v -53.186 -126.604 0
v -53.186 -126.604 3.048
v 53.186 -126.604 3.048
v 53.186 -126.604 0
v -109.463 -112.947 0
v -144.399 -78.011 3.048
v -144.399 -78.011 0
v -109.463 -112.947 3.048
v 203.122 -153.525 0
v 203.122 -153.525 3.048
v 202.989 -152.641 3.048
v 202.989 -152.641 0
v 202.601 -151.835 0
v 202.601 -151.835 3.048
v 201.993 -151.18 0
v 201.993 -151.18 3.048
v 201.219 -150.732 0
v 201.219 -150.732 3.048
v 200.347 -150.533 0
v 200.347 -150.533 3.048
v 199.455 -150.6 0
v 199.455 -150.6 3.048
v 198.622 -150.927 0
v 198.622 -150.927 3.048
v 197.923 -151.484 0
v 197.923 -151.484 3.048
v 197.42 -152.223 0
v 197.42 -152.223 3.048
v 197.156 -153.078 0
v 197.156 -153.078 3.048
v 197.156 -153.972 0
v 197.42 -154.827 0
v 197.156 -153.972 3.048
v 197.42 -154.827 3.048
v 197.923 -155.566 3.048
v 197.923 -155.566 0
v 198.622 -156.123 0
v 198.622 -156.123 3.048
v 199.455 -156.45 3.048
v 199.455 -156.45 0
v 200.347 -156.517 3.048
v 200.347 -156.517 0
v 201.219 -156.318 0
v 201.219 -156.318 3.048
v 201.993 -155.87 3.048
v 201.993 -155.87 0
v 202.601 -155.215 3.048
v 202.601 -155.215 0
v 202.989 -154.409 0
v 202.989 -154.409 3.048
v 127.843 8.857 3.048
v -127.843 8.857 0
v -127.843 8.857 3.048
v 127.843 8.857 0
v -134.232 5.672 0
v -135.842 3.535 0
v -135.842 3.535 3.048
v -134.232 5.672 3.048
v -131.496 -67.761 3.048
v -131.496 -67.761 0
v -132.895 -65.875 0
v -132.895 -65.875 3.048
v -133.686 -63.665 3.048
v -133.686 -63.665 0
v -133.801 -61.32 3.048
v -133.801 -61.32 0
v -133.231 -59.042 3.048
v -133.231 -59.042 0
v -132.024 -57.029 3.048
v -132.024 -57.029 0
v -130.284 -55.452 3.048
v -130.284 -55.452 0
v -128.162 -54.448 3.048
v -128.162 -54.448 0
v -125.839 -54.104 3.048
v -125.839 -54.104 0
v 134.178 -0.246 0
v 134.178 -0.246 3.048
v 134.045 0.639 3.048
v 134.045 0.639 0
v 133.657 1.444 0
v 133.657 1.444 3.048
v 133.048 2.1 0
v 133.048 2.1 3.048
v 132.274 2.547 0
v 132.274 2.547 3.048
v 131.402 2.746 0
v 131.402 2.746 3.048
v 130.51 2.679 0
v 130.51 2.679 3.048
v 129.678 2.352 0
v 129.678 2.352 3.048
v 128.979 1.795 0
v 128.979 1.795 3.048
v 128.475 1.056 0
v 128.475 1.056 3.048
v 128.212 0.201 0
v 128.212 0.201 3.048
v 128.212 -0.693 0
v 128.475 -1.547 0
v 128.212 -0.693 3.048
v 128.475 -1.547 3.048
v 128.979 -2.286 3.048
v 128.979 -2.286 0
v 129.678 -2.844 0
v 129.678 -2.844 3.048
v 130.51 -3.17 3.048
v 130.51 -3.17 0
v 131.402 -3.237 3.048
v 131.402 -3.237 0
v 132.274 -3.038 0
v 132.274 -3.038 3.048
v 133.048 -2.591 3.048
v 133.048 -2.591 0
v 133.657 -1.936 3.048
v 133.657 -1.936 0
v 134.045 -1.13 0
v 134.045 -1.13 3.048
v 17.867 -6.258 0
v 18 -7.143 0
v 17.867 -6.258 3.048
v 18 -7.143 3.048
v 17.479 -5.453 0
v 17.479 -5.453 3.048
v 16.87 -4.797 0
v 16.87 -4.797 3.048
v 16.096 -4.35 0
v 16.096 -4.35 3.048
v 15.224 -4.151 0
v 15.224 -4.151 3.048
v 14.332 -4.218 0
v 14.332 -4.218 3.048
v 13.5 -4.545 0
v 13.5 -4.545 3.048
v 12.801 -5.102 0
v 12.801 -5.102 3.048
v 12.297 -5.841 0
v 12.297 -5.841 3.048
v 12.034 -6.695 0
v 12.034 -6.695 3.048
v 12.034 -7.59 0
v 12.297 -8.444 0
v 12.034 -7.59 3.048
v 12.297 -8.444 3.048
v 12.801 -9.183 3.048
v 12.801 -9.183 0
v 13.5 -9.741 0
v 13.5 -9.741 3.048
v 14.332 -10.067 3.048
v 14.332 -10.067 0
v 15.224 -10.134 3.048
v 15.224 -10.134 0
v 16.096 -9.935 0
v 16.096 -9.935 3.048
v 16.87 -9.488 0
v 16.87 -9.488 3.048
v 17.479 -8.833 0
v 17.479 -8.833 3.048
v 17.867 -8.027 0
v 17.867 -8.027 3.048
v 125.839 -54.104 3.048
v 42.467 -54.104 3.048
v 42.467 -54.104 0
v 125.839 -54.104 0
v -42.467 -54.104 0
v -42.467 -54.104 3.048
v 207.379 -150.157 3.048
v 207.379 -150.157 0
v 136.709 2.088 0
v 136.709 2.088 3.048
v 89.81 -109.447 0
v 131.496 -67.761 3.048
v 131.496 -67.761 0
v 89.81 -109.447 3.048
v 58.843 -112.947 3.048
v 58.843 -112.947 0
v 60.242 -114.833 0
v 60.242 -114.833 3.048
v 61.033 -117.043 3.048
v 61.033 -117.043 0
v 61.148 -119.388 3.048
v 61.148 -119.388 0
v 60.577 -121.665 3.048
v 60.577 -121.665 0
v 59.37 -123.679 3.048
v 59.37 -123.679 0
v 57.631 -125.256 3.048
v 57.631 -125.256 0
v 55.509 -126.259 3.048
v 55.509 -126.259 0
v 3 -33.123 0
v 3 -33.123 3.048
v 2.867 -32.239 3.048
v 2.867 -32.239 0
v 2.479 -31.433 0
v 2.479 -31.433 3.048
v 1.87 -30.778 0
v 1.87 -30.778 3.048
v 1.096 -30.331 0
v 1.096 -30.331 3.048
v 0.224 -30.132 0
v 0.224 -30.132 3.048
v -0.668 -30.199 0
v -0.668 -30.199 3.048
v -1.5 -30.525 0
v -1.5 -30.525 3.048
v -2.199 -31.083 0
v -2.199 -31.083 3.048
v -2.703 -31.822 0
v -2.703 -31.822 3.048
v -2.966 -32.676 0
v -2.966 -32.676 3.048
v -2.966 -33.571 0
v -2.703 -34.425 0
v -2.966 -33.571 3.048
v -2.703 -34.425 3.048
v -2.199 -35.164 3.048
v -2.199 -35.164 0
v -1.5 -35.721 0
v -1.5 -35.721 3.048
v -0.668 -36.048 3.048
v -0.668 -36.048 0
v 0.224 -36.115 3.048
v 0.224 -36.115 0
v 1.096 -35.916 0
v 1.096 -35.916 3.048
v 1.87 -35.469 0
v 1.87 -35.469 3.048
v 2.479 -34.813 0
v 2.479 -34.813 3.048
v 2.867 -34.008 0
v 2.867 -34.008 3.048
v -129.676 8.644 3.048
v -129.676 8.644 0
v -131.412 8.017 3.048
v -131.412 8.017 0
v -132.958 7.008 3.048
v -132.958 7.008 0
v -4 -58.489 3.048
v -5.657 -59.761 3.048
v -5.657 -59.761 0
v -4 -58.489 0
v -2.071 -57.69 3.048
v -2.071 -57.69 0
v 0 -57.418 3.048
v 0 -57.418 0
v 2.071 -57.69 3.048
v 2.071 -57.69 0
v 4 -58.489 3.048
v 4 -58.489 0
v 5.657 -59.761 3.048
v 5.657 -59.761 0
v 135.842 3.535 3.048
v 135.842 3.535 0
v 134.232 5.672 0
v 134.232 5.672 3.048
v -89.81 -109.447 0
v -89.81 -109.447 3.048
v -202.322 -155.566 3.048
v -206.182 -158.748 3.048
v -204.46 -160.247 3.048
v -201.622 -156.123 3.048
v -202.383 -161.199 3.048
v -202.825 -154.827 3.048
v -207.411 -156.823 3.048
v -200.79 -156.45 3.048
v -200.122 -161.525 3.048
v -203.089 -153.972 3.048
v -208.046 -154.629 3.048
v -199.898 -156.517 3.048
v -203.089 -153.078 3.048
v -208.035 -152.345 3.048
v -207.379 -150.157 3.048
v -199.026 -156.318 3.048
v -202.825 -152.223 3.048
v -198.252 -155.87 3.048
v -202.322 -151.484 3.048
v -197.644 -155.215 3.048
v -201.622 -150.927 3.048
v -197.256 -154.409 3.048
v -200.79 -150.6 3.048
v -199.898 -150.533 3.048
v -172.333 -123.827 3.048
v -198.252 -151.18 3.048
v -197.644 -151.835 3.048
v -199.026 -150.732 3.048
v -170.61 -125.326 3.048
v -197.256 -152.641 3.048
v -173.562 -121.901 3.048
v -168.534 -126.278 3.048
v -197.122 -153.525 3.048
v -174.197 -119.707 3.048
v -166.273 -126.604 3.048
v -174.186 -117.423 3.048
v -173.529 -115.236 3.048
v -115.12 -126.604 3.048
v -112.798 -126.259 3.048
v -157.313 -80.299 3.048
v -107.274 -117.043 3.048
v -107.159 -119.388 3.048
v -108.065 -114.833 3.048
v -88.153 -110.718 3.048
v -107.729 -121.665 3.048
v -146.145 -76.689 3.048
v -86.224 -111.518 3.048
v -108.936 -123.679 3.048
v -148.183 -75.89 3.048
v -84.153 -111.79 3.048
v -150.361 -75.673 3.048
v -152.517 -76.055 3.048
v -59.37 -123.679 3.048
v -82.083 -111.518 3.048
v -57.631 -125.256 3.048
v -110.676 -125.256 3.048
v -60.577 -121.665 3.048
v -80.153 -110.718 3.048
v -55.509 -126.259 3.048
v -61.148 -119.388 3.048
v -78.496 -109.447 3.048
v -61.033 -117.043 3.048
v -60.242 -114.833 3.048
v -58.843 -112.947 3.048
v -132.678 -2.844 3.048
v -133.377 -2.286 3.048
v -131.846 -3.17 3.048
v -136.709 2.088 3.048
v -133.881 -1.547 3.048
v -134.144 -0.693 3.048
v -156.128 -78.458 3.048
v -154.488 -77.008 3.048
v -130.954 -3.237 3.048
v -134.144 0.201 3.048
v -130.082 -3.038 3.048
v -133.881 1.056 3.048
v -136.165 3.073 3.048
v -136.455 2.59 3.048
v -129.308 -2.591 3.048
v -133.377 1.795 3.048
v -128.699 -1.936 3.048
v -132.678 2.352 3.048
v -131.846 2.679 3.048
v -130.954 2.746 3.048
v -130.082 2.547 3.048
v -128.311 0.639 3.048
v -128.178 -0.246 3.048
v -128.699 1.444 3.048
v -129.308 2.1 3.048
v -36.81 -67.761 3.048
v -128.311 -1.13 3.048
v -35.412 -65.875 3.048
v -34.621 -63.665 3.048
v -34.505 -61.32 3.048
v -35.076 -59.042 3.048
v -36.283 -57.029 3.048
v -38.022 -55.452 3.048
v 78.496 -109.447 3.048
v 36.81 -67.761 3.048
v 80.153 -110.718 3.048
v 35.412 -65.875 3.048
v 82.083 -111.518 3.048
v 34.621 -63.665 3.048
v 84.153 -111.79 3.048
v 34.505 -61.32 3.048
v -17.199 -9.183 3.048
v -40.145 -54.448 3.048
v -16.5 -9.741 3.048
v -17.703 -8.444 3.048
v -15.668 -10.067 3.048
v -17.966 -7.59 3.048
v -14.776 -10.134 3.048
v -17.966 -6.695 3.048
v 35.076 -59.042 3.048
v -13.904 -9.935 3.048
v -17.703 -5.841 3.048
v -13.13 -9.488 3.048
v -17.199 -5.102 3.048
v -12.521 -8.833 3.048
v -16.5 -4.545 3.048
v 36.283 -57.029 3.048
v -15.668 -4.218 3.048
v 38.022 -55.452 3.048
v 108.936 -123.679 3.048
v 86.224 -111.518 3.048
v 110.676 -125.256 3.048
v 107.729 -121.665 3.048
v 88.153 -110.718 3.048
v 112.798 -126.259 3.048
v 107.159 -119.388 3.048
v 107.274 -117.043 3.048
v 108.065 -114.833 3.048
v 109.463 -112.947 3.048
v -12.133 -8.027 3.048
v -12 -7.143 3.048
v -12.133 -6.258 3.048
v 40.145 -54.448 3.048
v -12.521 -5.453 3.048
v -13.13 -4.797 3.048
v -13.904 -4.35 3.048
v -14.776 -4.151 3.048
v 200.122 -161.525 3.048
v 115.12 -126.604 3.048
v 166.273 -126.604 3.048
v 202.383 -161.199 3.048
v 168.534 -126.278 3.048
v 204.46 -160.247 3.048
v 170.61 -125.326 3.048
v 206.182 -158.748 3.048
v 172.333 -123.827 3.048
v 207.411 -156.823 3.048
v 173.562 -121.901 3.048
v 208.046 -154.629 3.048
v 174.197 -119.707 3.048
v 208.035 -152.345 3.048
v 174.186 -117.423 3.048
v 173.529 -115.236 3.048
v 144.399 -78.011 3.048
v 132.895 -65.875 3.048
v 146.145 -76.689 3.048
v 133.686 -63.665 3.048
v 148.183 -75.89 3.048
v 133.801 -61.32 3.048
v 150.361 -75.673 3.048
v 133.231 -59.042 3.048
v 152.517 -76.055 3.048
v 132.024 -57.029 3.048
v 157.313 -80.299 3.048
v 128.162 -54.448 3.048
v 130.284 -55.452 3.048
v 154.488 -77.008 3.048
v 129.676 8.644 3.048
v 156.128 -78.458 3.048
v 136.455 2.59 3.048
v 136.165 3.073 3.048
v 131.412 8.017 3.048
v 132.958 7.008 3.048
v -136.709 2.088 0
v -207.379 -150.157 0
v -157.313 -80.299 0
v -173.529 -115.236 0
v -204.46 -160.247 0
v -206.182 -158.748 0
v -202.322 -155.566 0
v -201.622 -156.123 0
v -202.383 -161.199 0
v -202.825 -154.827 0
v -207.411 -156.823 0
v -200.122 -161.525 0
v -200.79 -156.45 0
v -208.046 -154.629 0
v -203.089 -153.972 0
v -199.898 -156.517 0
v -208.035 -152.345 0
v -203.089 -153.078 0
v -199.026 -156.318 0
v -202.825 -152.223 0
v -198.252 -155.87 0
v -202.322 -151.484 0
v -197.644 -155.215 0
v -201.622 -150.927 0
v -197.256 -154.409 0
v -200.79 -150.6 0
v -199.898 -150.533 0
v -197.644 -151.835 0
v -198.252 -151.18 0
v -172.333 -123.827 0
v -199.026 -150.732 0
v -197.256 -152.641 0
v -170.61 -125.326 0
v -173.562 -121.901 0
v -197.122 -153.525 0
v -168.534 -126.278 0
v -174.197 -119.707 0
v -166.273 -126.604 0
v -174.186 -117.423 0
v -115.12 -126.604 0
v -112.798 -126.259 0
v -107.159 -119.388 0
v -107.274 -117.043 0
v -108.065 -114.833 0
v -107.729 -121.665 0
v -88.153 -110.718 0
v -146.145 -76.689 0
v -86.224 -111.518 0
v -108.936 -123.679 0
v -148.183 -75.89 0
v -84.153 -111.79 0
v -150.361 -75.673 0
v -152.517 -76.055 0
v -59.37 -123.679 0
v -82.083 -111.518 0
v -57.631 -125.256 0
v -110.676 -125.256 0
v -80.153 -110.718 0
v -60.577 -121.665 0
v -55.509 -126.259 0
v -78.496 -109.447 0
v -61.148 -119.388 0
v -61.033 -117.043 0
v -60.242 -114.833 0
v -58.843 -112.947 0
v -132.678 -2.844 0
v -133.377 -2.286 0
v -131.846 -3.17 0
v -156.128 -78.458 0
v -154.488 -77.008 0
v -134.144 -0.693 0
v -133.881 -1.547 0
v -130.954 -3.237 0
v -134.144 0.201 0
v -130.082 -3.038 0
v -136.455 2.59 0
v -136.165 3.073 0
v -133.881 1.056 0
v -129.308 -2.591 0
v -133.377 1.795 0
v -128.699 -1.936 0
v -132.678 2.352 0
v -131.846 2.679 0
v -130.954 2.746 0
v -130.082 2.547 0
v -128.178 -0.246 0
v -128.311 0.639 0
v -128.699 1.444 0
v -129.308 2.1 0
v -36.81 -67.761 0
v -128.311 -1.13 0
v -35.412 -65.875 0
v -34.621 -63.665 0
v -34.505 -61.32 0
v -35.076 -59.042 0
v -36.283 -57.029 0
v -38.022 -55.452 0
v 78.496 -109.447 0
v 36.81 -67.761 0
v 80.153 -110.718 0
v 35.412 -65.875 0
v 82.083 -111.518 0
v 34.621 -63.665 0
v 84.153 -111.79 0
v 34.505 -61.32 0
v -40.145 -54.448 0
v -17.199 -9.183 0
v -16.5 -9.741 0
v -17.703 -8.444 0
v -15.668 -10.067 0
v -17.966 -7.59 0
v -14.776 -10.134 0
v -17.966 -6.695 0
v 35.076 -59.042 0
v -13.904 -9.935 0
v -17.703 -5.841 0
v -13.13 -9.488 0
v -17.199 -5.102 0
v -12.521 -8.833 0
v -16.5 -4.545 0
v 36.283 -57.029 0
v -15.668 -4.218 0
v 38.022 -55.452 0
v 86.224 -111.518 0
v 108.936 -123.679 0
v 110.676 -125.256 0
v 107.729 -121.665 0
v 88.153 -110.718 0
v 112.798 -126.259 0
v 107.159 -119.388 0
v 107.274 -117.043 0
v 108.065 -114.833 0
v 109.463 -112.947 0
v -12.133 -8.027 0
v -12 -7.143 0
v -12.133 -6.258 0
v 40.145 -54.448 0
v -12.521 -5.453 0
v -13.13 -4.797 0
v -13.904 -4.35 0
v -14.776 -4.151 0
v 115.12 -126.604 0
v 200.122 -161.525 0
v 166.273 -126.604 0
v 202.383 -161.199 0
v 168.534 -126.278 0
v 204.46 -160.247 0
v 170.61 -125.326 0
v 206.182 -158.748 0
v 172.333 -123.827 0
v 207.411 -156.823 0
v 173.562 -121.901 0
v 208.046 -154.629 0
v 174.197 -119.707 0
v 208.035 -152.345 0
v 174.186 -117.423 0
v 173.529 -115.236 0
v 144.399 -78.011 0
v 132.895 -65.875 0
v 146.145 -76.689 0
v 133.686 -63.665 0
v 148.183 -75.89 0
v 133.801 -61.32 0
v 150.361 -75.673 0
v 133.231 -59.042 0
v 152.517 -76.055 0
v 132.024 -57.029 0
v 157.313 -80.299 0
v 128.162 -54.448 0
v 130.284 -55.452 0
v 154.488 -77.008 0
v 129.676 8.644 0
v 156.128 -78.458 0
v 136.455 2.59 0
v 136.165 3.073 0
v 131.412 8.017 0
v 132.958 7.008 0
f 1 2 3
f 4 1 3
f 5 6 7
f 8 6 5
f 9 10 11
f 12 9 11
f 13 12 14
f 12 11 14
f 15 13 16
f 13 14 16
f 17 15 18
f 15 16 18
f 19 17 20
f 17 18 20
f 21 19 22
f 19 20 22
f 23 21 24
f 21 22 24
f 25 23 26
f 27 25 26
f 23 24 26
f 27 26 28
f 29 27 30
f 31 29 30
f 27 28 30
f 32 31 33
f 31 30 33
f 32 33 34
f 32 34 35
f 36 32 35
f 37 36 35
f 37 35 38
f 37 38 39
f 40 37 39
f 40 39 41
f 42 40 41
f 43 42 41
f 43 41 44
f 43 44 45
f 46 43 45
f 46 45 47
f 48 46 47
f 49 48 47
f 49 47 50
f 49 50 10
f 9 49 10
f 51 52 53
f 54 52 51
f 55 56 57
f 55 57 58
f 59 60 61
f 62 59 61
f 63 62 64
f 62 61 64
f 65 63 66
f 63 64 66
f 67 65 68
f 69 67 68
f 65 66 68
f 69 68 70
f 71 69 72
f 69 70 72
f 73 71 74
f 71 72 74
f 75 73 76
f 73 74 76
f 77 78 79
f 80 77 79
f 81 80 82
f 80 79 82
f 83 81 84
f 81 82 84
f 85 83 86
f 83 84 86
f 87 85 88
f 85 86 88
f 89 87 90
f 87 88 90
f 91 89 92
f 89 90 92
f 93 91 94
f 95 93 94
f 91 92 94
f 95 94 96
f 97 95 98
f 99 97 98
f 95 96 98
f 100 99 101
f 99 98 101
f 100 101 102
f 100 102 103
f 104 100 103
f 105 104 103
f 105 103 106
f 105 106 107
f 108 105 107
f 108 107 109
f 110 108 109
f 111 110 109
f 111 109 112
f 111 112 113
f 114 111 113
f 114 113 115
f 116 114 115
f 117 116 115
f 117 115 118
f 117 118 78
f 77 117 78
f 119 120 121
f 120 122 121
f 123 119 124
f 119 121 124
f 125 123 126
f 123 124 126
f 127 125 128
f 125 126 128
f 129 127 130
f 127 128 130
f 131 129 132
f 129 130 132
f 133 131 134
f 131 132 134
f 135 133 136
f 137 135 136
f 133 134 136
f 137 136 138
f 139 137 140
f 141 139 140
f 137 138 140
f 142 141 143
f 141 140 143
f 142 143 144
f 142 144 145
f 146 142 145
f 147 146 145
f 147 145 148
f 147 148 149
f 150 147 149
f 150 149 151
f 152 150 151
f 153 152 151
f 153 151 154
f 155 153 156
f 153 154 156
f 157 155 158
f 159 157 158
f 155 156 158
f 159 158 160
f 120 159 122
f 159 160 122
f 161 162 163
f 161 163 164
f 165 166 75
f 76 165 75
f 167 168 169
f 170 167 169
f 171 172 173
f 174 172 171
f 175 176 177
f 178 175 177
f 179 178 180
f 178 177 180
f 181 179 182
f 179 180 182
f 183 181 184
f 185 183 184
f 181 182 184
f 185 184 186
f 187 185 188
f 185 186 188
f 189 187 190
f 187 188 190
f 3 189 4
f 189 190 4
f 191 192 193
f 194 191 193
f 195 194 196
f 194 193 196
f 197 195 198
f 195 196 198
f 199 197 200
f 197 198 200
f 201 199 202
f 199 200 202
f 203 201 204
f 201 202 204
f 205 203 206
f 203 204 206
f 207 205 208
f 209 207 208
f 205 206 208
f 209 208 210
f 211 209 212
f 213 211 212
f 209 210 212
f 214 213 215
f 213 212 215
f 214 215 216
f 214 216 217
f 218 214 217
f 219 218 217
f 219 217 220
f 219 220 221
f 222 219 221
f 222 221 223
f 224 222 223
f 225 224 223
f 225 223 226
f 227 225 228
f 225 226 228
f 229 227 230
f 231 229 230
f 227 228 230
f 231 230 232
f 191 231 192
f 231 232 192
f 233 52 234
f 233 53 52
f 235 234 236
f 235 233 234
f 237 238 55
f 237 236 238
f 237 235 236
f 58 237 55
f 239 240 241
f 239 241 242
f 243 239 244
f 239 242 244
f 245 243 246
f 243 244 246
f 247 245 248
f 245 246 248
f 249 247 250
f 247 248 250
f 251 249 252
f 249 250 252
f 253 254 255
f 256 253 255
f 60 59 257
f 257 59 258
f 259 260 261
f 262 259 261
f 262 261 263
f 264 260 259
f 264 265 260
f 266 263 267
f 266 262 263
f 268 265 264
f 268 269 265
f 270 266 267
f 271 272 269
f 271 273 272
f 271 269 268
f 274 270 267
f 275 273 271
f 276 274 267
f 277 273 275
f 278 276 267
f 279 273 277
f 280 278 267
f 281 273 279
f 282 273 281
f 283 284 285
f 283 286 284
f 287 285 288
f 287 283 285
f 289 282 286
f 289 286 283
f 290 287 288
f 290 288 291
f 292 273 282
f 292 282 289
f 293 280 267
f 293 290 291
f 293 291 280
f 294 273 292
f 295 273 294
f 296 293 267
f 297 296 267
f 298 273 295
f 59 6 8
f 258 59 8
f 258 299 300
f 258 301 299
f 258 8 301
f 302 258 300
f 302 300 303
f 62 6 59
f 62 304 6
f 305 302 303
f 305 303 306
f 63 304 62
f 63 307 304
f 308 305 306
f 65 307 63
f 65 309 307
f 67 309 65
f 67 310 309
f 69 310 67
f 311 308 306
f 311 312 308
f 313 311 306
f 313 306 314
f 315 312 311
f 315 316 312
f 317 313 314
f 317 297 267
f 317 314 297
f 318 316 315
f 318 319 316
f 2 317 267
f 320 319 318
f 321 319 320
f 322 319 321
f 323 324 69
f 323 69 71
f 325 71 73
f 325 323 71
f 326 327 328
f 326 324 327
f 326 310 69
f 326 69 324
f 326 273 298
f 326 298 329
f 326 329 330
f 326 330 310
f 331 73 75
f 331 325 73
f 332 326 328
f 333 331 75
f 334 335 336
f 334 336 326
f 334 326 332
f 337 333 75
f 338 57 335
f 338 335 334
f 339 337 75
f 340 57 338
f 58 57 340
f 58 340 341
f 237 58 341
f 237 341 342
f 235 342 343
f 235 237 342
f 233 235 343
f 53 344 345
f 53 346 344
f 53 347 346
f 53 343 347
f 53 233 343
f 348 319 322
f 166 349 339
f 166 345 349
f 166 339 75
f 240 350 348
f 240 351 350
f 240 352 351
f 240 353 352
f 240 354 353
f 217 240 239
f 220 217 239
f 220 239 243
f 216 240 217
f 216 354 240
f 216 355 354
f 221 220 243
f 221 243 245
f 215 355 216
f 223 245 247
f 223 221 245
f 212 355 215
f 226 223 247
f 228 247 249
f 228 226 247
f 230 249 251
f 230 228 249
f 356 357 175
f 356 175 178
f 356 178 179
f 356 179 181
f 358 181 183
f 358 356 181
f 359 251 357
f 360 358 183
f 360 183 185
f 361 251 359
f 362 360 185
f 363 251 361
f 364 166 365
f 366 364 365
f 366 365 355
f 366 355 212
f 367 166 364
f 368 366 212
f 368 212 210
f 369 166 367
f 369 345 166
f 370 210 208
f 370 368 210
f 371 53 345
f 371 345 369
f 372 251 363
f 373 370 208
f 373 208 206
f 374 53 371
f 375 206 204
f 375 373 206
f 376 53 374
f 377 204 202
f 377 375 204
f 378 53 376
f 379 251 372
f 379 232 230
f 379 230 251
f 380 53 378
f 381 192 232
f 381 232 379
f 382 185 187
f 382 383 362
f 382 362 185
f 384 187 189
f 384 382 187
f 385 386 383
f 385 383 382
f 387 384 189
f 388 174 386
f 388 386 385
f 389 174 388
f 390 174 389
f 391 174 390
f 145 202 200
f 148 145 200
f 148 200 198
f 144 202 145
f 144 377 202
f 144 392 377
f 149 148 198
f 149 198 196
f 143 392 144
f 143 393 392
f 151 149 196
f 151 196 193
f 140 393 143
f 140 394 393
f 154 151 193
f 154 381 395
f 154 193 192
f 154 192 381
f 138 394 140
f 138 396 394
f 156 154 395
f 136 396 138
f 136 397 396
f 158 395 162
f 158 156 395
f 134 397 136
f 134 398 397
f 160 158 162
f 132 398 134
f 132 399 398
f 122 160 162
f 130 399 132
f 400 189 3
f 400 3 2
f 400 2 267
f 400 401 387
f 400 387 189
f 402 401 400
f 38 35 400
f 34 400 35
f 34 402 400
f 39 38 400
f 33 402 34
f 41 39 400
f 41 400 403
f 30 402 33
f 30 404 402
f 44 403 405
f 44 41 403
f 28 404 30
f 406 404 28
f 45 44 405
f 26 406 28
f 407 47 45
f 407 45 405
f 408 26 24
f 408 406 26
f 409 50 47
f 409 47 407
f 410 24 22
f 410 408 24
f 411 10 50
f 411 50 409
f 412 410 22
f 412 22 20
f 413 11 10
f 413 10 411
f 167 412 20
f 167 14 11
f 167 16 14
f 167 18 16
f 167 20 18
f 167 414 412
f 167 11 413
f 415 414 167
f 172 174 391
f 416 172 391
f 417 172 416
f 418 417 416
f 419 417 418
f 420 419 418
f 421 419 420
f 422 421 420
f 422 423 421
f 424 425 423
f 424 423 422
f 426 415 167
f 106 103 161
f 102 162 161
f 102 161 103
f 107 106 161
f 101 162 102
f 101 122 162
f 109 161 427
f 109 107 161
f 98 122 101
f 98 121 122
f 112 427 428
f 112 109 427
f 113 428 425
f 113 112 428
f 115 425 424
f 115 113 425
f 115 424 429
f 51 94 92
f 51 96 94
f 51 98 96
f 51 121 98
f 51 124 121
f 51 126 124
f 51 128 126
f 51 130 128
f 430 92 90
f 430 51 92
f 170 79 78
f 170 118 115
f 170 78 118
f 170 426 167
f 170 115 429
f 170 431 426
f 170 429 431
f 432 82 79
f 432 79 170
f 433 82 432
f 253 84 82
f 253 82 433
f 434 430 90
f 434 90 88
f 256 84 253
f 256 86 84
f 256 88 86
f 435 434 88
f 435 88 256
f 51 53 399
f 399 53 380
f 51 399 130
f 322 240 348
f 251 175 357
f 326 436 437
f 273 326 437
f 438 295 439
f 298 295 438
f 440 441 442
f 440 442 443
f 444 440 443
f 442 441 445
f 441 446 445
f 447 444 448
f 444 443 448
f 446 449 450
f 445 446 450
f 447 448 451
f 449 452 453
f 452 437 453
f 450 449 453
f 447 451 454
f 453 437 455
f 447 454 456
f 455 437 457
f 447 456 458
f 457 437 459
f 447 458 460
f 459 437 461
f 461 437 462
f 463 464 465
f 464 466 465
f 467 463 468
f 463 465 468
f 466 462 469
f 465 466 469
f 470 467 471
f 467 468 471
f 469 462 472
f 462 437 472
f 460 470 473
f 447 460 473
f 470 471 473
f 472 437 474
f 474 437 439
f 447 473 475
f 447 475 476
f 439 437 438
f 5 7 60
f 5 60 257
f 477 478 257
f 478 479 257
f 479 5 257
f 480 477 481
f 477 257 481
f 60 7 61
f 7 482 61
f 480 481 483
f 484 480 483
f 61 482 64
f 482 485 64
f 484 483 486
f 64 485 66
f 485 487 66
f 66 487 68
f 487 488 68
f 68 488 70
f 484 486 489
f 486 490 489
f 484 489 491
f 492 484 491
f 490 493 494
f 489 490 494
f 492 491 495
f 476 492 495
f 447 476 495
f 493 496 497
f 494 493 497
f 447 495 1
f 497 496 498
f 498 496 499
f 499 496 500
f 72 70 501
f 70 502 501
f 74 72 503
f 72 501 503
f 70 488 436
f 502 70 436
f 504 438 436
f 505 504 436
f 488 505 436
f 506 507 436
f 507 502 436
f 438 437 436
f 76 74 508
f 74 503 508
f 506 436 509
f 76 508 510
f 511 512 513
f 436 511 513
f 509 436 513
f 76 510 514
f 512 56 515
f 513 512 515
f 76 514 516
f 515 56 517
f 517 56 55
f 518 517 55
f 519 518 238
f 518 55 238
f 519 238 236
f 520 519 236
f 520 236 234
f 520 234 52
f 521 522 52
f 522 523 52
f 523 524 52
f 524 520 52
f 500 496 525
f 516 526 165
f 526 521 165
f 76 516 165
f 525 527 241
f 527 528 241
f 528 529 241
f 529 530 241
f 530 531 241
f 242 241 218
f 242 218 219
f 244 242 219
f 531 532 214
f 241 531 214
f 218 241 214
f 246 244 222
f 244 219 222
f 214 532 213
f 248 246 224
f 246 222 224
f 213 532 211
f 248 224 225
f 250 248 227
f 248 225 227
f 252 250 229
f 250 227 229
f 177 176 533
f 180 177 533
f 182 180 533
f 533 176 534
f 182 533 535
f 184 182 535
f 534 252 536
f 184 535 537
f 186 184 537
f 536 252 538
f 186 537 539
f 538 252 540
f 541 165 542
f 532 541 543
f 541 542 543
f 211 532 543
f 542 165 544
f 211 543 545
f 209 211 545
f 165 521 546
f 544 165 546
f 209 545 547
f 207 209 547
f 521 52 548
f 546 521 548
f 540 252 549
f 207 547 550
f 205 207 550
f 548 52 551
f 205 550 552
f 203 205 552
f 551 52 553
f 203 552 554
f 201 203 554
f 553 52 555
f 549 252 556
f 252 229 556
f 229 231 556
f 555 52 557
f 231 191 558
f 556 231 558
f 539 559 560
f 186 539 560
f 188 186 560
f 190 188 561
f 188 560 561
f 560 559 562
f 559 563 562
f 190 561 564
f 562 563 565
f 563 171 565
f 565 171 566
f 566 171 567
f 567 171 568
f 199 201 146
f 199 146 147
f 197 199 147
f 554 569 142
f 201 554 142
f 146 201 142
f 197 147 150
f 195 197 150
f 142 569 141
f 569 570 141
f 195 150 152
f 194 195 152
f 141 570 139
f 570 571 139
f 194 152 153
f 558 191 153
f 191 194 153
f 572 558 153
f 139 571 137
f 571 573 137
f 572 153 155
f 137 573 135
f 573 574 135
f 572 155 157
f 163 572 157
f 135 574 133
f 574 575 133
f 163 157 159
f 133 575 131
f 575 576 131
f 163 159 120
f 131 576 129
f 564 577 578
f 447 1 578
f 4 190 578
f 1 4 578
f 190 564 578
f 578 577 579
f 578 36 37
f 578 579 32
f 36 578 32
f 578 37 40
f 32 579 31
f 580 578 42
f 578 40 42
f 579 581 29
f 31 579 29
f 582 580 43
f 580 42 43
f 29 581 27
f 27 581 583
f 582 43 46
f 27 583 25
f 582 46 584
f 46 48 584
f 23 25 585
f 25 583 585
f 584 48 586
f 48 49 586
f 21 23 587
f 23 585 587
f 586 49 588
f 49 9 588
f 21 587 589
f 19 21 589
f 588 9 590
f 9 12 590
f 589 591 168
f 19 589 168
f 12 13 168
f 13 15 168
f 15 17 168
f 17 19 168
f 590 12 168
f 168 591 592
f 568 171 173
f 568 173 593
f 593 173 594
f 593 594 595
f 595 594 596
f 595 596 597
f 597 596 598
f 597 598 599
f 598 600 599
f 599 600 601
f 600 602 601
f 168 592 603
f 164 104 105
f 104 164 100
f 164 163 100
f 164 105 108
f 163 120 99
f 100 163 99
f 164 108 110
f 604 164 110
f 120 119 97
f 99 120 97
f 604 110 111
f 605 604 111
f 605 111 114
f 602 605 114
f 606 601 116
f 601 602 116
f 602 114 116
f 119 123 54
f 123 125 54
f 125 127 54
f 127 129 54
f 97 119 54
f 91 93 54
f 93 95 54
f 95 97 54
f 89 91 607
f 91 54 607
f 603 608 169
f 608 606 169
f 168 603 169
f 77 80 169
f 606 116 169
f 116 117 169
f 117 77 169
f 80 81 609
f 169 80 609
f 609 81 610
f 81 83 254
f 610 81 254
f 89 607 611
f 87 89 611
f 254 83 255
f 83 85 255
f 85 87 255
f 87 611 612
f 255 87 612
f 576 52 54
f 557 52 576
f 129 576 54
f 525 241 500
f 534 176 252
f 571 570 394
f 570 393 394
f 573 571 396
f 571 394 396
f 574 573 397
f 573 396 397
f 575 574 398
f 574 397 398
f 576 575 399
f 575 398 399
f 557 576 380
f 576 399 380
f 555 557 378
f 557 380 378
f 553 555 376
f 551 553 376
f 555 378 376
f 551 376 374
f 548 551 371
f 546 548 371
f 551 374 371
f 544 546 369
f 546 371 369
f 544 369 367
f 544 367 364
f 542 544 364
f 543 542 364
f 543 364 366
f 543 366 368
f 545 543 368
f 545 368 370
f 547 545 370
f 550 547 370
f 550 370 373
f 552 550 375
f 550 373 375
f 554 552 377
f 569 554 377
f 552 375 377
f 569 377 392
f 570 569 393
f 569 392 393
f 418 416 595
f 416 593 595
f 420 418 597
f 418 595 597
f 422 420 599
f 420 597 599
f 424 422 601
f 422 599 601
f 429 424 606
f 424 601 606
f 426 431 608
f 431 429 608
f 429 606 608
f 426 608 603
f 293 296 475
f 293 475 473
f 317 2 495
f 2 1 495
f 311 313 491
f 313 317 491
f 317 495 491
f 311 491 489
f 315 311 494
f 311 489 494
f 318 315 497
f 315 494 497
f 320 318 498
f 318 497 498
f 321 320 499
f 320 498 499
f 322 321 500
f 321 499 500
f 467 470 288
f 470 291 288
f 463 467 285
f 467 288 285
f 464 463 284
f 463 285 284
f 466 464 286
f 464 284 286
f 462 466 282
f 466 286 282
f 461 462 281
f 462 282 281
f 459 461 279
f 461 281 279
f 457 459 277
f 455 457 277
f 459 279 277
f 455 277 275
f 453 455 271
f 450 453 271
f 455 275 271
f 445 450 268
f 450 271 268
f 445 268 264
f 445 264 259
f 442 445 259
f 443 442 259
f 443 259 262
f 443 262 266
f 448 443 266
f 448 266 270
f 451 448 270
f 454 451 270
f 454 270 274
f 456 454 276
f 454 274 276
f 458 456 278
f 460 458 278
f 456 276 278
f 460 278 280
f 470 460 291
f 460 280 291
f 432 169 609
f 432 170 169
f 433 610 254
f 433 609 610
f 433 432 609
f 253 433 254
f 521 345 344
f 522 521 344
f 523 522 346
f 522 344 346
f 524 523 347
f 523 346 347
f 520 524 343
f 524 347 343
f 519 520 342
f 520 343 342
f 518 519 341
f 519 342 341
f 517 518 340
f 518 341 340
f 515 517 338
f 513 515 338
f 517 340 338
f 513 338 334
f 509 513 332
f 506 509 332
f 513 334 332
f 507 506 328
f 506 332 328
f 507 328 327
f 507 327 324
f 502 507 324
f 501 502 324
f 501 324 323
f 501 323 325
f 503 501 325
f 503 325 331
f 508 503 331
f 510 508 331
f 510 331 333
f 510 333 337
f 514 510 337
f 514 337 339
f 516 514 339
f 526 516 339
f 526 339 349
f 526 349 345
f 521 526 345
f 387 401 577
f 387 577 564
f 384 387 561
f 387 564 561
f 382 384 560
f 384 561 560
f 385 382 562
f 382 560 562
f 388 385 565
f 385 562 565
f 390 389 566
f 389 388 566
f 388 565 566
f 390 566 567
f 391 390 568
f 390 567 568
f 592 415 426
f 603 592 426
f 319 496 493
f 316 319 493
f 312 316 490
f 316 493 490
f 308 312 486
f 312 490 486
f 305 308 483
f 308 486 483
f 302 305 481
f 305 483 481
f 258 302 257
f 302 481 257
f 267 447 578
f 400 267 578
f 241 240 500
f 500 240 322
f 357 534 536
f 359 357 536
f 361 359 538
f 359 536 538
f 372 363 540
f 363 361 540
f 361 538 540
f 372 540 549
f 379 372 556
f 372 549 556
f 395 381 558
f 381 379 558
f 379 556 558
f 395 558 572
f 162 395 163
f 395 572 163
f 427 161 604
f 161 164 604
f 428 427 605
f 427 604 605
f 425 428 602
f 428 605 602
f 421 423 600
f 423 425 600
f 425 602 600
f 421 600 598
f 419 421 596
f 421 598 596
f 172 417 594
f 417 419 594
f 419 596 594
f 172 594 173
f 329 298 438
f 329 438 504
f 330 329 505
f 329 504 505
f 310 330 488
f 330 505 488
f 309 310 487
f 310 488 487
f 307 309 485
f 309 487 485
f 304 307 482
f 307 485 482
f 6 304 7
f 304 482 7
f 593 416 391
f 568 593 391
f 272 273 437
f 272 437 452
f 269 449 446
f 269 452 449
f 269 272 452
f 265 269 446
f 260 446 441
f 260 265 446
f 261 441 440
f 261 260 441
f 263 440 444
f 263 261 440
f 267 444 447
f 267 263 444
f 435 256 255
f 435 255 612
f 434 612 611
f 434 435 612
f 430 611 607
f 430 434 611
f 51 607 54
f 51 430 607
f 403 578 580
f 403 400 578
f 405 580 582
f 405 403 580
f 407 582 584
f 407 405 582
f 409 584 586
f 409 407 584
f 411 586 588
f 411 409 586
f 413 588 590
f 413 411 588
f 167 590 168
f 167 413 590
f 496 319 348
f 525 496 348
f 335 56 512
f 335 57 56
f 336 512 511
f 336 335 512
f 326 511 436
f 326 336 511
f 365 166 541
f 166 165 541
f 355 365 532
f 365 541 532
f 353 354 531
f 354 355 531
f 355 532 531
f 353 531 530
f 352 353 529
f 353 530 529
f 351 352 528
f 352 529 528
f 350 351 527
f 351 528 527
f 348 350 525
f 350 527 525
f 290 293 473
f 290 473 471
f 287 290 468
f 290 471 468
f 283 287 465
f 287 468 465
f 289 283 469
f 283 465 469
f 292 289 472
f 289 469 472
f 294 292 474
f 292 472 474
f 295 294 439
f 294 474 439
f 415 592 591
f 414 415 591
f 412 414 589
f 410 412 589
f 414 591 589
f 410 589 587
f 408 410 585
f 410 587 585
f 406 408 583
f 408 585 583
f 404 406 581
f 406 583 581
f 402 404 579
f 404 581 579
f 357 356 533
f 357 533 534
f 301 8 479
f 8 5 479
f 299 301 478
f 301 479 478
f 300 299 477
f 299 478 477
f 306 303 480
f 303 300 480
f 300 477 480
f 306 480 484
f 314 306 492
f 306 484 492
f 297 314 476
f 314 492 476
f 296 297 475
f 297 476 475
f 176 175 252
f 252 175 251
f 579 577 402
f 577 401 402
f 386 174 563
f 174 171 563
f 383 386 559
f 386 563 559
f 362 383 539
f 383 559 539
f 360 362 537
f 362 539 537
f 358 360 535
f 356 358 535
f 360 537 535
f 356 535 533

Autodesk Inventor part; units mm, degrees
ref_plane "YZ Plane" through (0, 0, 0) normal (1, 0, 0) x (0, 1, 0)
ref_plane "XZ Plane" through (0, 0, 0) normal (0, 1, 0) x (-1, 0, 0)
ref_plane "XY Plane" through (0, 0, 0) normal (0, 0, 1) x (1, 0, 0)
sketch "Sketch1" plane through (0, 0, 0) normal (0, 0, 1) x (1, 0, 0)
  line L0 (-64.749, 104.525) -> (-139.8022, 4.926) construction
  line L1 (0, 104.525) -> (-64.749, 104.525) construction
  line L2 (-139.8022, 4.926) -> (-218.9225, -165.525) construction
  line L3 (0, -219.535) -> (0, 158.535) construction
  line L4 (64.749, 104.525) -> (139.8022, 4.926) construction
  line L5 (0, 104.525) -> (64.749, 104.525) construction
  line L6 (139.8022, 4.926) -> (218.9225, -165.525) construction
  line L7 (-218.9225, -165.525) -> (0, -165.525) construction
  line L8 (218.9225, -165.525) -> (0, -165.525) construction
  line L9 (-62.7547, 100.525) -> (-136.3525, 2.8574) construction
  line L10 (-136.3525, 2.8574) -> (-212.6558, -161.525)
  line L11 (-212.6558, -161.525) -> (0, -161.525)
  line L12 (0, -161.525) -> (212.6558, -161.525)
  line L13 (212.6558, -161.525) -> (136.3525, 2.8574)
  line L14 (136.3525, 2.8574) -> (62.7547, 100.525) construction
  line L15 (62.7547, 100.525) -> (0, 100.525) construction
  line L16 (0, 100.525) -> (-62.7547, 100.525) construction
  line L17 (-136.3525, 2.8574) -> (-131.8312, 8.8574)
  line L18 (-131.8312, 8.8574) -> (0, 8.8574)
  line L19 (136.3525, 2.8574) -> (131.8312, 8.8574)
  line L20 (131.8312, 8.8574) -> (0, 8.8574)
  point P0 (0, 0)
  dimension "d0" = 4
  dimension "d34" = 6
extrude "Plate1" add sketch "Sketch1" along normal blind 3.048
fillet "Fillet1" radius 8 6 edges at (-212.6558, -161.525, 1.524) (212.6558, -161.525, 1.524) (-131.8312, 8.8574, 1.524) (-136.3525, 2.8574, 1.524) (131.8312, 8.8574, 1.524) (136.3525, 2.8574, 1.524)
sketch "Sketch3" plane through (0, 0, 3.048) normal (0, 0, 1) x (1, 0, 0)
  arc A0 (200.1225, -161.525) -> (207.3789, -150.1567) centre (200.1225, -153.525) ccw construction
  line L0 (136.7095, 2.0883) -> (207.3789, -150.1567) construction
  line L1 (-207.3789, -150.1567) -> (-136.7095, 2.0883) construction
  arc A1 (-207.3789, -150.1567) -> (-200.1225, -161.525) centre (-200.1225, -153.525) ccw construction
  line L2 (200.1225, -161.525) -> (-200.1225, -161.525) construction
  line L3 (-59.7632, 94.525) -> (59.7632, 94.525) construction
  line L4 (59.7632, 94.525) -> (131.178, -0.2457) construction
  line L5 (131.178, -0.2457) -> (203.2558, -155.525) construction
  line L6 (203.2558, -155.525) -> (-203.2558, -155.525) construction
  line L7 (-203.2558, -155.525) -> (-131.178, -0.2457) construction
  line L8 (-131.178, -0.2457) -> (-59.7632, 94.525) construction
  circle A2 centre (-59.7632, 94.525) radius 3
  circle A3 centre (59.7632, 94.525) radius 3
  circle A4 centre (-131.178, -0.2457) radius 3
  circle A5 centre (131.178, -0.2457) radius 3
  circle A6 centre (-200.1225, -153.525) radius 3
  line L9 (0, -215.7211) -> (0, 149.7327) construction
  circle A7 centre (200.1225, -153.525) radius 3
  arc A8 (136.7095, 2.0883) -> (135.8422, 3.5345) centre (129.4531, -1.28) ccw projected
  line L10 (134.2316, 5.6719) -> (135.8422, 3.5345) projected
  arc A9 (134.2316, 5.6719) -> (127.8425, 8.8574) centre (127.8425, 0.8574) ccw projected
  line L11 (-127.8425, 8.8574) -> (127.8425, 8.8574) projected
  arc A10 (-127.8425, 8.8574) -> (-134.2316, 5.6719) centre (-127.8425, 0.8574) ccw projected
  line L12 (-135.8422, 3.5345) -> (-134.2316, 5.6719) projected
  arc A11 (-135.8422, 3.5345) -> (-136.7095, 2.0883) centre (-129.4531, -1.28) ccw projected
  point P0 (0, 0)
  dimension "d4" = 6
extrude "Cut1" cut sketch "Sketch3" against normal blind 3.048
sketch "Sketch5" plane through (0, 0, 3.048) normal (0, 0, 1) x (1, 0, 0)
  circle A0 centre (-131.178, -0.2457) radius 3 construction
  circle A1 centre (131.178, -0.2457) radius 3 construction
  circle A2 centre (-200.1225, -153.525) radius 3 construction
  circle A3 centre (200.1225, -153.525) radius 3 construction
  arc A4 (136.7095, 2.0883) -> (135.8422, 3.5345) centre (129.4531, -1.28) ccw construction
  line L0 (134.2316, 5.6719) -> (135.8422, 3.5345) construction
  arc A5 (134.2316, 5.6719) -> (127.8425, 8.8574) centre (127.8425, 0.8574) ccw construction
  line L1 (-127.8425, 8.8574) -> (127.8425, 8.8574) construction
  arc A6 (-127.8425, 8.8574) -> (-134.2316, 5.6719) centre (-127.8425, 0.8574) ccw construction
  line L2 (-135.8422, 3.5345) -> (-134.2316, 5.6719) construction
  arc A7 (-135.8422, 3.5345) -> (-136.7095, 2.0883) centre (-129.4531, -1.28) ccw construction
  line L3 (-207.3789, -150.1567) -> (-136.7095, 2.0883) construction
  arc A8 (-207.3789, -150.1567) -> (-200.1225, -161.525) centre (-200.1225, -153.525) ccw construction
  line L4 (200.1225, -161.525) -> (-200.1225, -161.525) construction
  arc A9 (200.1225, -161.525) -> (207.3789, -150.1567) centre (200.1225, -153.525) ccw construction
  line L5 (136.7095, 2.0883) -> (207.3789, -150.1567) construction
  line L6 (0, -198.138) -> (0, 44.2342) construction
  line L7 (-100, 8.8574) -> (-100, -161.525) construction
  line L8 (-207.3789, -150.1567) -> (-136.7095, 2.0883) projected
  line L9 (200.1225, -161.525) -> (-200.1225, -161.525) projected
  line L10 (-15, -7.1426) -> (15, -7.1426) construction
  line L11 (15, -7.1426) -> (0, -33.1234) construction
  line L12 (0, -33.1234) -> (-15, -7.1426) construction
  circle A10 centre (-15, -7.1426) radius 3
  circle A11 centre (15, -7.1426) radius 3
  circle A12 centre (0, -33.1234) radius 3
  circle A13 centre (-100, -38.1039) radius 3
  circle A14 centre (-100, -142.6039) radius 3
  circle A15 centre (100, -38.1039) radius 3
  circle A16 centre (100, -142.6039) radius 3
  line L13 (0, -54.1039) -> (-72.5, -126.6039)
  line L14 (-72.5, -126.6039) -> (72.5, -126.6039)
  line L15 (72.5, -126.6039) -> (0, -54.1039)
  line L16 (-84.1532, -115.1039) -> (-23.1532, -54.1039)
  line L17 (-23.1532, -54.1039) -> (-145.1532, -54.1039)
  line L18 (-145.1532, -54.1039) -> (-84.1532, -115.1039)
  line L19 (-152.4933, -69.9169) -> (-95.8064, -126.6039)
  line L20 (-95.8064, -126.6039) -> (-178.8064, -126.6039)
  line L21 (-178.8064, -126.6039) -> (-152.4933, -69.9169)
  line L22 (-145.1532, -54.1039) -> (-152.4933, -69.9169) construction
  line L23 (-23.1532, -54.1039) -> (0, -54.1039) construction
  line L24 (-95.8064, -126.6039) -> (-72.5, -126.6039) construction
  line L25 (-84.1532, -115.1039) -> (-84.1532, -126.6039) construction
  line L26 (84.1532, -115.1039) -> (23.1532, -54.1039)
  line L27 (23.1532, -54.1039) -> (145.1532, -54.1039)
  line L28 (145.1532, -54.1039) -> (84.1532, -115.1039)
  line L29 (152.4933, -69.9169) -> (95.8064, -126.6039)
  line L30 (95.8064, -126.6039) -> (178.8064, -126.6039)
  line L31 (178.8064, -126.6039) -> (152.4933, -69.9169)
  point P0 (0, 0)
  point P1 (0, -7.1426)
  dimension "d38" = 60
  dimension "d39" = 30
  dimension "d40" = 16
  dimension "d41" = 6
  dimension "d54" = 100
  dimension "d57" = 45
  dimension "d58" = 16
  dimension "d59" = 16
  dimension "d60" = 145
  dimension "d61" = 122
  dimension "d62" = 83
  dimension "d63" = 16
extrude "Cut3" cut sketch "Sketch5" against normal blind 3.048 contours A10 | A11 | A12 | L15 L14 L13 | L18 L17 L16 | L19 L20 L21 | L26 L27 L28 | L31 L30 L29
fillet "Fillet3" radius 8 15 edges at (72.5, -126.6039, 1.524) (0, -54.1039, 1.524) (-72.5, -126.6039, 1.524) (-178.8064, -126.6039, 1.524) (-152.4933, -69.9169, 1.524) (-95.8064, -126.6039, 1.524) (178.8064, -126.6039, 1.524) (95.8064, -126.6039, 1.524) (152.4933, -69.9169, 1.524) (145.1532, -54.1039, 1.524) (84.1532, -115.1039, 1.524) (23.1532, -54.1039, 1.524) (-84.1532, -115.1039, 1.524) (-145.1532, -54.1039, 1.524) (-23.1532, -54.1039, 1.524)
equation "\"d4\" = d3"
equation "\"d5\" = Thickness"
equation "\"d1\" = Thickness"
equation "\"BendRadius\" = Thickness"
equation "\"BendReliefWidth\" = Thickness"
equation "\"BendReliefDepth\" = 0.5 * Thickness"
equation "\"CornerReliefSize\" = 4 * Thickness"
equation "\"MinimumRemnant\" = 2 * Thickness"
equation "\"TransitionRadius\" = BendRadius"
equation "\"JacobiRadiusSize\" = BendRadius"
equation "\"GapSize\" = Thickness"
equation "\"d3\" = 6"
equation "\"Thickness\" = 3.048"
properties part number "ChestFront"
